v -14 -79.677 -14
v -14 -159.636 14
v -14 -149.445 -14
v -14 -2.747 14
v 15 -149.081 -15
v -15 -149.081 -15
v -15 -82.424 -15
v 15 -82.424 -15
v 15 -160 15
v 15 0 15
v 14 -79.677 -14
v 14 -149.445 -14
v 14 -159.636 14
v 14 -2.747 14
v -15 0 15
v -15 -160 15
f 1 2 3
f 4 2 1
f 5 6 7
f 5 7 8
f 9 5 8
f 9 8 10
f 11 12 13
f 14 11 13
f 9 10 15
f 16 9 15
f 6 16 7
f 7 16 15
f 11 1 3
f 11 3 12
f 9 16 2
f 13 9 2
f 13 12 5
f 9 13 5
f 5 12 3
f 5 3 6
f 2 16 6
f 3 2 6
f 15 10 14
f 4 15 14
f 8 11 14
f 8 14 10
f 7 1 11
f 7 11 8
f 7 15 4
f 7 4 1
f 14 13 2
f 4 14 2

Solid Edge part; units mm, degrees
sketch "Sketch1" plane through (0, 0, 0) normal (0, -1, 0) x (1, 0, 0)
  line L0 (-15, 15) -> (-15, -15)
  line L1 (-15, -15) -> (15, -15)
  line L2 (15, -15) -> (15, 15)
  line L3 (15, 15) -> (-15, 15)
  line L4 (-14, 14) -> (-14, -14)
  line L5 (-14, -14) -> (14, -14)
  line L6 (14, -14) -> (14, 14)
  line L7 (14, 14) -> (-14, 14)
extrude "Protrusion1" add sketch "Sketch1" along normal blind 160
sketch "Sketch2" plane through (-15, -100, 0) normal (-1, 0, 0) x (0, -1, 0)
  line L0 (-100, 15) -> (-17.5757, -15)
  line L1 (-100, -15) -> (-17.5757, -15)
  line L2 (-100, 15) -> (-100, -15)
extrude "ExtrudedCutout_1" cut sketch "Sketch2" against normal blind 853.4319
sketch "Sketch3" plane through (-15, -80, 0) normal (-1, 0, 0) x (0, -1, 0)
  line L0 (80, 15) -> (80, -15)
  line L1 (80, -15) -> (69.0809, -15)
  line L2 (80, 15) -> (69.0809, -15)
extrude "ExtrudedCutout_2" cut sketch "Sketch3" against normal blind 51.9593
fillet "Round_1" [suppressed]
